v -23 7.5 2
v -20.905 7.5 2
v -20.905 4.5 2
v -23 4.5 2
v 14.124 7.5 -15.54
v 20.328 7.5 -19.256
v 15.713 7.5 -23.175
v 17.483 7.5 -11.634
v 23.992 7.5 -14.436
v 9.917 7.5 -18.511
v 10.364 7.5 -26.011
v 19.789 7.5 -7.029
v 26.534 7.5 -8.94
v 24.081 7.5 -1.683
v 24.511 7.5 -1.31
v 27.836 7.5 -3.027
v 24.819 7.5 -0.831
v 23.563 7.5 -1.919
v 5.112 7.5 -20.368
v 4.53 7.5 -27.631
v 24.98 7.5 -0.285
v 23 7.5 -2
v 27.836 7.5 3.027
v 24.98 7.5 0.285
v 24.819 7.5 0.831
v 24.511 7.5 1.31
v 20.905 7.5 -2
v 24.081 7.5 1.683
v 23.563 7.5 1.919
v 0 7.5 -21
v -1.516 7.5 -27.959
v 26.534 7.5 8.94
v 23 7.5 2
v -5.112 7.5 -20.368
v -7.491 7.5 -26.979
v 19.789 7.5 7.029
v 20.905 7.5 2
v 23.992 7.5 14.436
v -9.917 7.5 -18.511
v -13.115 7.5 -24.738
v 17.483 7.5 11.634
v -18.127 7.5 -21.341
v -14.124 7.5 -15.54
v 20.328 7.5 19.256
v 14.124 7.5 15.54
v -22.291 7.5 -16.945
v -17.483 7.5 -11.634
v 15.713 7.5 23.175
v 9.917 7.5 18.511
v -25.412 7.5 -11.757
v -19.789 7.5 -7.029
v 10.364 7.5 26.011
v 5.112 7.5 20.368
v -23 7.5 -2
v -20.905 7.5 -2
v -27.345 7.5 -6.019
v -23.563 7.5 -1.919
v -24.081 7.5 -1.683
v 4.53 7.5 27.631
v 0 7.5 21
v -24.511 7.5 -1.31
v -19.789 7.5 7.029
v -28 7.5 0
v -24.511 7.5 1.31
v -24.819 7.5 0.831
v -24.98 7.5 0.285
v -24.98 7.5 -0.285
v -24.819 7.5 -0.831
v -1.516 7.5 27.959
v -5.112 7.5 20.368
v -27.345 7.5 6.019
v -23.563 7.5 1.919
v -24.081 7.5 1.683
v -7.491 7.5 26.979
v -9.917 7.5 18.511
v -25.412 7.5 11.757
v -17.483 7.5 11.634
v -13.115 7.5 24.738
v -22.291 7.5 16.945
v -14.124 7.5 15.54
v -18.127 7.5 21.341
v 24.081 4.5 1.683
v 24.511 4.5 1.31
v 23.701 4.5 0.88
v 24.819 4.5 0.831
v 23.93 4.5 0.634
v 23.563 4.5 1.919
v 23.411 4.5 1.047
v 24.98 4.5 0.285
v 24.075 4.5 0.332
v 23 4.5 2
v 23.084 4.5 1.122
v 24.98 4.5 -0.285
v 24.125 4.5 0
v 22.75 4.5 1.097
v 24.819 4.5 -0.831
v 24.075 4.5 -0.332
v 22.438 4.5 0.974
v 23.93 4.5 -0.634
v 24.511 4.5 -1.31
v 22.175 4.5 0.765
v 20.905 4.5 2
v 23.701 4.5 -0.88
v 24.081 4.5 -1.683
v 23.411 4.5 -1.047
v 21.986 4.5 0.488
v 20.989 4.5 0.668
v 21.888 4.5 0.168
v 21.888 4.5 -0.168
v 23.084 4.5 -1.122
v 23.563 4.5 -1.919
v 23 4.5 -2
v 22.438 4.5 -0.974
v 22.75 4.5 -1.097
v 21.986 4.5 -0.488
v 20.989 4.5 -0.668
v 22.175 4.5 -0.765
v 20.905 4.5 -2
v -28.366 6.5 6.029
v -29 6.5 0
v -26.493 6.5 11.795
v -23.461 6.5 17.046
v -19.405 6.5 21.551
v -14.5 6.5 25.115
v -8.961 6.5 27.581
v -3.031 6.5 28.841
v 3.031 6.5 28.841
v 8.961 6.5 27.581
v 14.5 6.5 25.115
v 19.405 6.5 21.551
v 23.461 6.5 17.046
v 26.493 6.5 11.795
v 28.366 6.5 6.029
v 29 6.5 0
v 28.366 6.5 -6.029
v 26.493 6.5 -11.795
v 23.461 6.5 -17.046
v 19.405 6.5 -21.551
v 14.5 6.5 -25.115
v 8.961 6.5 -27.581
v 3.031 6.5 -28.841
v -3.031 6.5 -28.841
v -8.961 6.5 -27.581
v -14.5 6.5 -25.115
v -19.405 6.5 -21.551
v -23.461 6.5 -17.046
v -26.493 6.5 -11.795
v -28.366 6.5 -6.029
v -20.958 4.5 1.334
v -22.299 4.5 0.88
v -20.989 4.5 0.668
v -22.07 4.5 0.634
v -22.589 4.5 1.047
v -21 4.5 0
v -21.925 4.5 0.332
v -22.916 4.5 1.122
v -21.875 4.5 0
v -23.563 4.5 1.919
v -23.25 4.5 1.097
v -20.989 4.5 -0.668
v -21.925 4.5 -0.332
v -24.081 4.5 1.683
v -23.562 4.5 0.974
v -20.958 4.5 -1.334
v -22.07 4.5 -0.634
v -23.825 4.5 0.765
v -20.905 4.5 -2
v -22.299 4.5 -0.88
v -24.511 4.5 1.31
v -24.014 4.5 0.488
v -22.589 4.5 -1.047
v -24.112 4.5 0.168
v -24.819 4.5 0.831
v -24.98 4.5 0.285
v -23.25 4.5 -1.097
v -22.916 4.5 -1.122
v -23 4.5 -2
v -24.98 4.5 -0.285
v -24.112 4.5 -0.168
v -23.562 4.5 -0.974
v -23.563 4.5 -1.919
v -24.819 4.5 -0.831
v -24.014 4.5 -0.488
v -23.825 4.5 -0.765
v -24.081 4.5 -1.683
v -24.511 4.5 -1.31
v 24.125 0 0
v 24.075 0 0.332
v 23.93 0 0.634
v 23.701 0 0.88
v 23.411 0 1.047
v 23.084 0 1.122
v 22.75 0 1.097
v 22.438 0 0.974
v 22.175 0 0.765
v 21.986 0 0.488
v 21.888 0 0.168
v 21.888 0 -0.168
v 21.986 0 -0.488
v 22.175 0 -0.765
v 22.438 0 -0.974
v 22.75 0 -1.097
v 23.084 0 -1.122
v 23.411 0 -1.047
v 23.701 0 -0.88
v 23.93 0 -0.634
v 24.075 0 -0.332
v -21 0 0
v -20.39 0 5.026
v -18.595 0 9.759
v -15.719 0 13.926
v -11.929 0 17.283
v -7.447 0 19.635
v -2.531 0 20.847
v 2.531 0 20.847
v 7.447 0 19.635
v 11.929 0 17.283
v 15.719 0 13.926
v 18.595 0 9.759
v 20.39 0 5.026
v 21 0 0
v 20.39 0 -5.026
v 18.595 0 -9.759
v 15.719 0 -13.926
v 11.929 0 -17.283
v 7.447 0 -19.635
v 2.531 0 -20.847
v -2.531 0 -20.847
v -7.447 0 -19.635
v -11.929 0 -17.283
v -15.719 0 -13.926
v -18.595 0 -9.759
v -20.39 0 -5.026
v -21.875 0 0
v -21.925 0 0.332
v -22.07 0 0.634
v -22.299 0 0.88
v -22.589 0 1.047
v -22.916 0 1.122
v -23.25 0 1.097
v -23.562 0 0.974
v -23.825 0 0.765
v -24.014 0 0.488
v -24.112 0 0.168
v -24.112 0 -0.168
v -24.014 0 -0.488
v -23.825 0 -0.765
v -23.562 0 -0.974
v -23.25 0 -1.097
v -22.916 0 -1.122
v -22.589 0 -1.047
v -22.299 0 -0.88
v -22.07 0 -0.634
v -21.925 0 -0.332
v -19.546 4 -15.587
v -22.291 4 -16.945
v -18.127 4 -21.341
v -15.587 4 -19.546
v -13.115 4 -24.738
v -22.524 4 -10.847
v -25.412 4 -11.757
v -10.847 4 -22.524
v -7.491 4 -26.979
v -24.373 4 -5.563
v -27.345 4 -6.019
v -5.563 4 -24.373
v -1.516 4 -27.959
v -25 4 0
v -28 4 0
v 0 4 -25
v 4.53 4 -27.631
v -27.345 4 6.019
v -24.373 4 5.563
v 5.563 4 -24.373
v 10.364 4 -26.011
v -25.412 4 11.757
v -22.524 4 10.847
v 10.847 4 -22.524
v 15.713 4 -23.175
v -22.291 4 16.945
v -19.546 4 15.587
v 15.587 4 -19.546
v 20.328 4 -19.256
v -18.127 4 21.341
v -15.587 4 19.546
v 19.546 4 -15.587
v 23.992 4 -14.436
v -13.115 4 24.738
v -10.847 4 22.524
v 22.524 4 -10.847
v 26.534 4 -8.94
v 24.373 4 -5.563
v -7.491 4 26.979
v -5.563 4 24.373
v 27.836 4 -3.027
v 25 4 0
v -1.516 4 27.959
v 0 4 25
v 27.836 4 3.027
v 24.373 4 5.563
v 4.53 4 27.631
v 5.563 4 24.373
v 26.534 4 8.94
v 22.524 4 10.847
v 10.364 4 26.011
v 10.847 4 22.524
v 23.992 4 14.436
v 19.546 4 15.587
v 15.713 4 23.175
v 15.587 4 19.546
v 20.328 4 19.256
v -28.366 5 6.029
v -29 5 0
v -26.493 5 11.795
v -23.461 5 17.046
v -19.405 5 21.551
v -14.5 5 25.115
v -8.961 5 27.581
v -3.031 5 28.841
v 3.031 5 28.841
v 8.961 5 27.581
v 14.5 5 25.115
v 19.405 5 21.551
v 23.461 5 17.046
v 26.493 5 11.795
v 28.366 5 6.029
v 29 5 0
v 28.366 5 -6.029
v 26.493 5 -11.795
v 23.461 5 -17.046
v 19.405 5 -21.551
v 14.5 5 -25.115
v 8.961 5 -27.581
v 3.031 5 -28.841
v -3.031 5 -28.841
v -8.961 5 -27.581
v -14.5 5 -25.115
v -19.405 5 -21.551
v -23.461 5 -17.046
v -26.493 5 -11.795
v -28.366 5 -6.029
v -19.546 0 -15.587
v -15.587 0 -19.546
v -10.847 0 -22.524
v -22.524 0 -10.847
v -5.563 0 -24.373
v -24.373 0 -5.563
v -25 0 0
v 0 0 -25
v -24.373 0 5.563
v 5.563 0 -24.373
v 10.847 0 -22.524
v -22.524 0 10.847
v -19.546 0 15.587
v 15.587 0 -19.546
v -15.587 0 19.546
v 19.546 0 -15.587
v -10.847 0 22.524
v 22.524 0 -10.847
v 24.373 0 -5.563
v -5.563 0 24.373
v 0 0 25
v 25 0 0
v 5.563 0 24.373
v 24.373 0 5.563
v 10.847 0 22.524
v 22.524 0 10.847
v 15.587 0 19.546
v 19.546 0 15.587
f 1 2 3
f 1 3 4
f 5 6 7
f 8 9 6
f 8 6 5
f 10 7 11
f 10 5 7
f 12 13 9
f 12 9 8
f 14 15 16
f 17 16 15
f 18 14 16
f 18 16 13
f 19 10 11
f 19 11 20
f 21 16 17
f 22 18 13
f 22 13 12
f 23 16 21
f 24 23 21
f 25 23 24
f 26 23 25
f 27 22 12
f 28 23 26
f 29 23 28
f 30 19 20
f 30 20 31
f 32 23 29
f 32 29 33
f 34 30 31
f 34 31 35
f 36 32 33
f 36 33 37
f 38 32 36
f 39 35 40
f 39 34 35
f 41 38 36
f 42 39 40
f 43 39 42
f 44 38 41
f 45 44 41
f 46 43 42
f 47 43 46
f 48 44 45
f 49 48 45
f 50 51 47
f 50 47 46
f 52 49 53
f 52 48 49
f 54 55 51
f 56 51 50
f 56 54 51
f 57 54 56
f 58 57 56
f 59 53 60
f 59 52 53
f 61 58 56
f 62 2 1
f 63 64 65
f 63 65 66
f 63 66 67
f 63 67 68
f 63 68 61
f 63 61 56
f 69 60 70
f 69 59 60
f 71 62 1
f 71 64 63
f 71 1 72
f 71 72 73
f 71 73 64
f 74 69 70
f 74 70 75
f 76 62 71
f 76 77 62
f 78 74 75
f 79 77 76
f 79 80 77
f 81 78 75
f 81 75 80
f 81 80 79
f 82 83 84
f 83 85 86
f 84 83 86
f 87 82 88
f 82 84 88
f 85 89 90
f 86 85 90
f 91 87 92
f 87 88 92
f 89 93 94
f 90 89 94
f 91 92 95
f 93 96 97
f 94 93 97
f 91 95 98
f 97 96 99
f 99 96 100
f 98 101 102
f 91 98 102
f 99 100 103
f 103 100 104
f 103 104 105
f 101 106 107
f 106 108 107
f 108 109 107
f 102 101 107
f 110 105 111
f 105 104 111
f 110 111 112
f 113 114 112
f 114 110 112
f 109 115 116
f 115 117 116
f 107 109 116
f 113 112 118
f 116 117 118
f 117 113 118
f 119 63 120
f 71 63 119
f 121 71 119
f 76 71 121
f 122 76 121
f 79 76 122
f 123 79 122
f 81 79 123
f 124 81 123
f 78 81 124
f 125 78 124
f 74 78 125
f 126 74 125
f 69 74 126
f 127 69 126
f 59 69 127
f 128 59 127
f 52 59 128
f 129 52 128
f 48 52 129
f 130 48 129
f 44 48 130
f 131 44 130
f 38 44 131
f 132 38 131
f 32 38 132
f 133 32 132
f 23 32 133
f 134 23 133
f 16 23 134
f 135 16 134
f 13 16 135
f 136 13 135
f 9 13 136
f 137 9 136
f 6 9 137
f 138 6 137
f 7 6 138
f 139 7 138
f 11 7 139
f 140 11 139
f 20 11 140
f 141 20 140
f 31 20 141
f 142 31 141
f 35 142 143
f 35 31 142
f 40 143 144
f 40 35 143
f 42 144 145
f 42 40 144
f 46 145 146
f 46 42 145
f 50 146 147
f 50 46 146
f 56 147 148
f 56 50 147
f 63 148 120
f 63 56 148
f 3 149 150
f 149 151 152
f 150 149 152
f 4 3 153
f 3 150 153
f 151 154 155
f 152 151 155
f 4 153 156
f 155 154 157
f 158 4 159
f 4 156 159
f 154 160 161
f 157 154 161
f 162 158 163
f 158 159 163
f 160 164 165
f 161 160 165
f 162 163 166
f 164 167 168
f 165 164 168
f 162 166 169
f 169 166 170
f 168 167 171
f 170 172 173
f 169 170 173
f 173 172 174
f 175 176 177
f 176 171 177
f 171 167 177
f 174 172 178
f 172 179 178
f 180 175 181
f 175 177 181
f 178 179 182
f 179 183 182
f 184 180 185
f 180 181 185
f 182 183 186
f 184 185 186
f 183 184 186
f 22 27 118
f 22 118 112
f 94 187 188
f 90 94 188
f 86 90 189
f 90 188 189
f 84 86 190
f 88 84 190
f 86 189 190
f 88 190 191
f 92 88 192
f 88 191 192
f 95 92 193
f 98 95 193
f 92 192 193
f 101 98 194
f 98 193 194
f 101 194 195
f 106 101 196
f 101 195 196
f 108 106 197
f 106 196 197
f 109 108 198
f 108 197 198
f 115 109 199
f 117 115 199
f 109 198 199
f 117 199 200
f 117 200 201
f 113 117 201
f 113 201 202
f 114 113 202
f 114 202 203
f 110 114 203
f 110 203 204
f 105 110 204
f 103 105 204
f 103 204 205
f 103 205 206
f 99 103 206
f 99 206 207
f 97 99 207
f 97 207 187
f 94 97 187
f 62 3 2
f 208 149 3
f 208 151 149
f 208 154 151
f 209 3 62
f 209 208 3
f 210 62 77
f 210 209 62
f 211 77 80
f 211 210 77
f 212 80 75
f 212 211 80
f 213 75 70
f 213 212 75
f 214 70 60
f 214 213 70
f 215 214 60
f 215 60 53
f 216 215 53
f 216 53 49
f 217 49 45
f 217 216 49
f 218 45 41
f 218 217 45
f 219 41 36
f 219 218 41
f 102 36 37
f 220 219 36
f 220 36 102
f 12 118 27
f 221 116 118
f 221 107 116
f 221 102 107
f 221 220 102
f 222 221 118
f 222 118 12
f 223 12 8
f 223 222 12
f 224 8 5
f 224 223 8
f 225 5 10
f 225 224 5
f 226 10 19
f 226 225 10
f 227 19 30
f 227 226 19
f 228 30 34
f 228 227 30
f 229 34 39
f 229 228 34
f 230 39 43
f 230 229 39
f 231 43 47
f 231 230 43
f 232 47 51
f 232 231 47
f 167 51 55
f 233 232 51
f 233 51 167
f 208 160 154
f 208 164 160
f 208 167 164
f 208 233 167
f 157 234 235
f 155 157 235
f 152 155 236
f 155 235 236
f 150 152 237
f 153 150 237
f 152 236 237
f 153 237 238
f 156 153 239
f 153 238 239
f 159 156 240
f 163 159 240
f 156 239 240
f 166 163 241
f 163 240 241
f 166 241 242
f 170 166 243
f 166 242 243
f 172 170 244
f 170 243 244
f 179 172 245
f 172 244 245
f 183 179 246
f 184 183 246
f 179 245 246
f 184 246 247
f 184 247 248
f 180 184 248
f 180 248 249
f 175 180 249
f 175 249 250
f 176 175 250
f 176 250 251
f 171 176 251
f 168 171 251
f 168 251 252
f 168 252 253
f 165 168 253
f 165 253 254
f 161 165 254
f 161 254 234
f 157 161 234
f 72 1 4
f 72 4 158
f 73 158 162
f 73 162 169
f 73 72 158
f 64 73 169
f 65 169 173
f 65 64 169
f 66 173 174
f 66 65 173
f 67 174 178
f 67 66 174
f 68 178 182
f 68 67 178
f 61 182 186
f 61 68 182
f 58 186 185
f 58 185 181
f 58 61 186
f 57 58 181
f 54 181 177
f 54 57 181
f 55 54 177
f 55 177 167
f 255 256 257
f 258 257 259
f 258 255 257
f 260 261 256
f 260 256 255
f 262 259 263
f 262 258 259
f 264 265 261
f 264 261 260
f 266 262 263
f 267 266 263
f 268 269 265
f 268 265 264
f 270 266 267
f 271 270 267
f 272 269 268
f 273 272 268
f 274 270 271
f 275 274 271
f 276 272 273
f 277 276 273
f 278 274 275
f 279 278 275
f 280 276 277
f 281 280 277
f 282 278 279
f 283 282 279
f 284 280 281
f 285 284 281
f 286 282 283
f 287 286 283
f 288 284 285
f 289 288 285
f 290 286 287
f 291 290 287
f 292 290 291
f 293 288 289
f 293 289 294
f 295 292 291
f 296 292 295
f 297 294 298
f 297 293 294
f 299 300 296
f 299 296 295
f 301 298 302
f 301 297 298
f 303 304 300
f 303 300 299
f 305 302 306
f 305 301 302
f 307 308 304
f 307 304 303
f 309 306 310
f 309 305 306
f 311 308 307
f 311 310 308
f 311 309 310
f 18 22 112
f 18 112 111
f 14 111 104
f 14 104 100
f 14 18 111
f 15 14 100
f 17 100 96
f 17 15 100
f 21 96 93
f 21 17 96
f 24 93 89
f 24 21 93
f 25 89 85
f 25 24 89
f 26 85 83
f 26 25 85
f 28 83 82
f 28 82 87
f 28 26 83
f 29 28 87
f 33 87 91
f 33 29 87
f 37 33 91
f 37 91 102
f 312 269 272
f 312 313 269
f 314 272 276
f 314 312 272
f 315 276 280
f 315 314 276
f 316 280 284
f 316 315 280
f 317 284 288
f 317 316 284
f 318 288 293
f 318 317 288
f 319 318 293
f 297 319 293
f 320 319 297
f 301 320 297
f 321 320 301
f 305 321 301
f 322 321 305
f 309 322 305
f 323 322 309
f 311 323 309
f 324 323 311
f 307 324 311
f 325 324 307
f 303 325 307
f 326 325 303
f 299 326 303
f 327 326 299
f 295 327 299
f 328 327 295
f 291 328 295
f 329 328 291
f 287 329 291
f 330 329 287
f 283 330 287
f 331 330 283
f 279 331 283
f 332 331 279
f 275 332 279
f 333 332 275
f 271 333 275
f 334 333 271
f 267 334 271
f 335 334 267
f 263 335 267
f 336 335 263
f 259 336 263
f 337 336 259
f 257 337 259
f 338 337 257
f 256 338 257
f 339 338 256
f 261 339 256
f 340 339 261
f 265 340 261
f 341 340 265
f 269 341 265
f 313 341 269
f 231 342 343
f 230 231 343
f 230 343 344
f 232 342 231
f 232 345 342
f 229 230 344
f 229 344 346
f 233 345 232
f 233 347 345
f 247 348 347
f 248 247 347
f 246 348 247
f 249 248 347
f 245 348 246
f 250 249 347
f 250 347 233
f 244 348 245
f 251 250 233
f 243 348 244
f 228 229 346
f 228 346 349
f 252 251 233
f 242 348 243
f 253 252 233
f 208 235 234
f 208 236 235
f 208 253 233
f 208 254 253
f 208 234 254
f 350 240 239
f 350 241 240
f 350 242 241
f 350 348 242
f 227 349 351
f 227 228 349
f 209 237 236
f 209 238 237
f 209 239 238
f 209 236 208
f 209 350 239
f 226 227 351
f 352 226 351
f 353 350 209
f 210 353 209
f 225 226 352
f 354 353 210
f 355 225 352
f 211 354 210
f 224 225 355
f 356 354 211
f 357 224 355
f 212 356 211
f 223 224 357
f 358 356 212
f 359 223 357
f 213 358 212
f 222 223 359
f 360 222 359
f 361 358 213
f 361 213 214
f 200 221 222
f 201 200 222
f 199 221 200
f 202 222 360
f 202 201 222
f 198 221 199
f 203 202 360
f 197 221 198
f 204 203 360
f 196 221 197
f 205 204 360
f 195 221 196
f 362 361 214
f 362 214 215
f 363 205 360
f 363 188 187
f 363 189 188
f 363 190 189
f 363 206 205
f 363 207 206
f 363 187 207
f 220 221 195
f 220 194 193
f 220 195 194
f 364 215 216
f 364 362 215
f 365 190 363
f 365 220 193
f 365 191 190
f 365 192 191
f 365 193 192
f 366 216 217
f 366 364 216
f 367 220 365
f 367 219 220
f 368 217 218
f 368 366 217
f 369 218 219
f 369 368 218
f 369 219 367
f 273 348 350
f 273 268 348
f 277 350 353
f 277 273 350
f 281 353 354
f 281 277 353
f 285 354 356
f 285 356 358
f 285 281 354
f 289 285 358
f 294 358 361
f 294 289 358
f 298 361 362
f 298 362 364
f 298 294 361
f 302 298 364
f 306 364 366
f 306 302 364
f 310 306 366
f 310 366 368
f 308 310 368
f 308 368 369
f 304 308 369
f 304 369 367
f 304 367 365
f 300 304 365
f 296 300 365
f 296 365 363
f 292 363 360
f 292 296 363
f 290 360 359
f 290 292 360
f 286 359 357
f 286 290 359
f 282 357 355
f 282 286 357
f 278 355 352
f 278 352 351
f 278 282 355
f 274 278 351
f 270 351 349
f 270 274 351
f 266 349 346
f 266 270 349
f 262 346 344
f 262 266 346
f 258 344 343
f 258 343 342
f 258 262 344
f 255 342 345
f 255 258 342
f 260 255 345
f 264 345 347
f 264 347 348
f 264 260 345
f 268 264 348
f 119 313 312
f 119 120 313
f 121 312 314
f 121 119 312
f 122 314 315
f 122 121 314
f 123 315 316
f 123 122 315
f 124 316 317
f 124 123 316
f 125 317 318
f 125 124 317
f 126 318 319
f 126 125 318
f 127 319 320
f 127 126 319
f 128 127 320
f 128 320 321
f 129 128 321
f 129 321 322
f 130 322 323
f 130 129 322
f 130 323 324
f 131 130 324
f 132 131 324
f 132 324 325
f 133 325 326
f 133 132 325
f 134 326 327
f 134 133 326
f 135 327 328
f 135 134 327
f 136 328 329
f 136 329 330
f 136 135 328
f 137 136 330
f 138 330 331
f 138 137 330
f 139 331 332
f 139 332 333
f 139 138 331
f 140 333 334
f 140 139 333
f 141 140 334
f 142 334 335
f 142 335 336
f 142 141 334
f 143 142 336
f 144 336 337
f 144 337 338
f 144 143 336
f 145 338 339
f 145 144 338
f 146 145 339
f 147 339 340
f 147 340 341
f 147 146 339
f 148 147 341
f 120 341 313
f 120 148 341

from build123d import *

# Parameters (mm, degrees)
SKETCH2_R          = 1.125
CUT_EXTRUDE1_DEPTH = 8.5
CUT_EXTRUDE3_DEPTH = 3


with BuildPart() as part:
    # Sketch1 → Revolve1 (revolve)
    with BuildSketch(Plane.XY):
        Polygon((-29, 5), (-29, 6.5), (-28, 7.5), (-21, 7.5), (-21, 0), (-25, 0), (-25, 4), (-28, 4), align=None)
    revolve(axis=Axis((0, 0, 0), (0, 1, 0)))

    # Sketch2 → Cut-Extrude1 (cut, through all)
    with BuildSketch(Plane.XZ):
        with Locations((-23, 0)):
            Circle(SKETCH2_R)
        with Locations((23, 0)):
            Circle(SKETCH2_R)
    extrude(amount=-CUT_EXTRUDE1_DEPTH, mode=Mode.SUBTRACT)

    # Sketch3 → Cut-Extrude3 (cut)
    with BuildSketch(Plane(origin=(0, 7.5, 0), x_dir=(1, 0, 0), z_dir=(0, 1, 0))):
        with BuildLine():
            Line((-23, 2), (23, 2))
            ThreePointArc((23, 2), (25, 0), (23, -2))
            Line((23, -2), (-23, -2))
            ThreePointArc((-23, -2), (-25, 0), (-23, 2))
        make_face()
    extrude(amount=-CUT_EXTRUDE3_DEPTH, mode=Mode.SUBTRACT)


solid = part.part
